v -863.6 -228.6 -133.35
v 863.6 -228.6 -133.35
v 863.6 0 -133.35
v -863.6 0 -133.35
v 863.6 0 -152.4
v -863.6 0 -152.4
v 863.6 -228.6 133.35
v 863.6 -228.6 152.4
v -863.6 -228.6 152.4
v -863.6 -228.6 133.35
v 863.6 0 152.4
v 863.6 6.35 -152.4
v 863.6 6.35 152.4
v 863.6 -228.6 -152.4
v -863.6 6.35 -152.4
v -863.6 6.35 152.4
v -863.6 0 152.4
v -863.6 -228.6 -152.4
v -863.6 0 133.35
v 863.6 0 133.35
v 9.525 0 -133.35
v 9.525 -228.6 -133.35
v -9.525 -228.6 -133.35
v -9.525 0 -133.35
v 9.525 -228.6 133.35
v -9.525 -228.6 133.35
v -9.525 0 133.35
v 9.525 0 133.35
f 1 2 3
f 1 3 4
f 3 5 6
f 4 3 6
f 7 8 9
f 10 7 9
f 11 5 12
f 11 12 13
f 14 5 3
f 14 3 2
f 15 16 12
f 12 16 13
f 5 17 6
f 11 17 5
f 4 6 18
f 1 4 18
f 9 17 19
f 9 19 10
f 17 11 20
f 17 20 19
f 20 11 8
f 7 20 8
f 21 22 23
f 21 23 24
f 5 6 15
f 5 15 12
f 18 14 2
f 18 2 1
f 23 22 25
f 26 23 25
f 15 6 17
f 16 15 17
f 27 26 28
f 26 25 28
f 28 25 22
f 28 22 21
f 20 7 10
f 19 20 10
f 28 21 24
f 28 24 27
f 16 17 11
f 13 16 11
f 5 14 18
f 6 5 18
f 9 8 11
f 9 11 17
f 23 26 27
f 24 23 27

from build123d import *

# Parameters (mm, degrees)
F0_W          = 1727.2
F0_H          = 304.8
F1_DEPTH      = 6.35
F3_E1_0_W     = 1727.2
F3_E1_0_H     = 228.6
F4_DEPTH      = 19.05
F6_W          = 228.6
F6_H          = 266.7
F7_DEPTH      = 9.525
F7_DEPTH_BACK = 9.525


# Not quite as in the source:
# - a feature names something its author has since deleted; it is built from what else it names


with BuildPart() as f1:
    # F0 (on Front) → F1 (new body)
    with BuildSketch(Plane.XZ):
        Rectangle(F0_W, F0_H)
    extrude(amount=-F1_DEPTH)


with BuildPart() as f4:
    # F3_E1_0 (on explicit) → F4 (new body)
    with BuildSketch(Plane(origin=(863.6, 0, 152.4), x_dir=(-1, 0, 0), z_dir=(0, 0, 1))):
        with Locations((863.6, 114.3)):
            Rectangle(F3_E1_0_W, F3_E1_0_H)
    extrude(amount=-F4_DEPTH)


with BuildPart() as f5_1:
    # F5: instance of F4
    add(f4.part.mirror(Plane.XY))


with BuildPart() as f7:
    # F6 (on Right) → F7 (new body, two sides)
    with BuildSketch(Plane.YZ) as f7_sk:
        with Locations((-114.3, 0)):
            Rectangle(F6_W, F6_H)
    extrude(amount=F7_DEPTH)
    extrude(f7_sk.sketch, amount=-F7_DEPTH_BACK)


solid = Compound([f1.part, f4.part, f5_1.part, f7.part])
